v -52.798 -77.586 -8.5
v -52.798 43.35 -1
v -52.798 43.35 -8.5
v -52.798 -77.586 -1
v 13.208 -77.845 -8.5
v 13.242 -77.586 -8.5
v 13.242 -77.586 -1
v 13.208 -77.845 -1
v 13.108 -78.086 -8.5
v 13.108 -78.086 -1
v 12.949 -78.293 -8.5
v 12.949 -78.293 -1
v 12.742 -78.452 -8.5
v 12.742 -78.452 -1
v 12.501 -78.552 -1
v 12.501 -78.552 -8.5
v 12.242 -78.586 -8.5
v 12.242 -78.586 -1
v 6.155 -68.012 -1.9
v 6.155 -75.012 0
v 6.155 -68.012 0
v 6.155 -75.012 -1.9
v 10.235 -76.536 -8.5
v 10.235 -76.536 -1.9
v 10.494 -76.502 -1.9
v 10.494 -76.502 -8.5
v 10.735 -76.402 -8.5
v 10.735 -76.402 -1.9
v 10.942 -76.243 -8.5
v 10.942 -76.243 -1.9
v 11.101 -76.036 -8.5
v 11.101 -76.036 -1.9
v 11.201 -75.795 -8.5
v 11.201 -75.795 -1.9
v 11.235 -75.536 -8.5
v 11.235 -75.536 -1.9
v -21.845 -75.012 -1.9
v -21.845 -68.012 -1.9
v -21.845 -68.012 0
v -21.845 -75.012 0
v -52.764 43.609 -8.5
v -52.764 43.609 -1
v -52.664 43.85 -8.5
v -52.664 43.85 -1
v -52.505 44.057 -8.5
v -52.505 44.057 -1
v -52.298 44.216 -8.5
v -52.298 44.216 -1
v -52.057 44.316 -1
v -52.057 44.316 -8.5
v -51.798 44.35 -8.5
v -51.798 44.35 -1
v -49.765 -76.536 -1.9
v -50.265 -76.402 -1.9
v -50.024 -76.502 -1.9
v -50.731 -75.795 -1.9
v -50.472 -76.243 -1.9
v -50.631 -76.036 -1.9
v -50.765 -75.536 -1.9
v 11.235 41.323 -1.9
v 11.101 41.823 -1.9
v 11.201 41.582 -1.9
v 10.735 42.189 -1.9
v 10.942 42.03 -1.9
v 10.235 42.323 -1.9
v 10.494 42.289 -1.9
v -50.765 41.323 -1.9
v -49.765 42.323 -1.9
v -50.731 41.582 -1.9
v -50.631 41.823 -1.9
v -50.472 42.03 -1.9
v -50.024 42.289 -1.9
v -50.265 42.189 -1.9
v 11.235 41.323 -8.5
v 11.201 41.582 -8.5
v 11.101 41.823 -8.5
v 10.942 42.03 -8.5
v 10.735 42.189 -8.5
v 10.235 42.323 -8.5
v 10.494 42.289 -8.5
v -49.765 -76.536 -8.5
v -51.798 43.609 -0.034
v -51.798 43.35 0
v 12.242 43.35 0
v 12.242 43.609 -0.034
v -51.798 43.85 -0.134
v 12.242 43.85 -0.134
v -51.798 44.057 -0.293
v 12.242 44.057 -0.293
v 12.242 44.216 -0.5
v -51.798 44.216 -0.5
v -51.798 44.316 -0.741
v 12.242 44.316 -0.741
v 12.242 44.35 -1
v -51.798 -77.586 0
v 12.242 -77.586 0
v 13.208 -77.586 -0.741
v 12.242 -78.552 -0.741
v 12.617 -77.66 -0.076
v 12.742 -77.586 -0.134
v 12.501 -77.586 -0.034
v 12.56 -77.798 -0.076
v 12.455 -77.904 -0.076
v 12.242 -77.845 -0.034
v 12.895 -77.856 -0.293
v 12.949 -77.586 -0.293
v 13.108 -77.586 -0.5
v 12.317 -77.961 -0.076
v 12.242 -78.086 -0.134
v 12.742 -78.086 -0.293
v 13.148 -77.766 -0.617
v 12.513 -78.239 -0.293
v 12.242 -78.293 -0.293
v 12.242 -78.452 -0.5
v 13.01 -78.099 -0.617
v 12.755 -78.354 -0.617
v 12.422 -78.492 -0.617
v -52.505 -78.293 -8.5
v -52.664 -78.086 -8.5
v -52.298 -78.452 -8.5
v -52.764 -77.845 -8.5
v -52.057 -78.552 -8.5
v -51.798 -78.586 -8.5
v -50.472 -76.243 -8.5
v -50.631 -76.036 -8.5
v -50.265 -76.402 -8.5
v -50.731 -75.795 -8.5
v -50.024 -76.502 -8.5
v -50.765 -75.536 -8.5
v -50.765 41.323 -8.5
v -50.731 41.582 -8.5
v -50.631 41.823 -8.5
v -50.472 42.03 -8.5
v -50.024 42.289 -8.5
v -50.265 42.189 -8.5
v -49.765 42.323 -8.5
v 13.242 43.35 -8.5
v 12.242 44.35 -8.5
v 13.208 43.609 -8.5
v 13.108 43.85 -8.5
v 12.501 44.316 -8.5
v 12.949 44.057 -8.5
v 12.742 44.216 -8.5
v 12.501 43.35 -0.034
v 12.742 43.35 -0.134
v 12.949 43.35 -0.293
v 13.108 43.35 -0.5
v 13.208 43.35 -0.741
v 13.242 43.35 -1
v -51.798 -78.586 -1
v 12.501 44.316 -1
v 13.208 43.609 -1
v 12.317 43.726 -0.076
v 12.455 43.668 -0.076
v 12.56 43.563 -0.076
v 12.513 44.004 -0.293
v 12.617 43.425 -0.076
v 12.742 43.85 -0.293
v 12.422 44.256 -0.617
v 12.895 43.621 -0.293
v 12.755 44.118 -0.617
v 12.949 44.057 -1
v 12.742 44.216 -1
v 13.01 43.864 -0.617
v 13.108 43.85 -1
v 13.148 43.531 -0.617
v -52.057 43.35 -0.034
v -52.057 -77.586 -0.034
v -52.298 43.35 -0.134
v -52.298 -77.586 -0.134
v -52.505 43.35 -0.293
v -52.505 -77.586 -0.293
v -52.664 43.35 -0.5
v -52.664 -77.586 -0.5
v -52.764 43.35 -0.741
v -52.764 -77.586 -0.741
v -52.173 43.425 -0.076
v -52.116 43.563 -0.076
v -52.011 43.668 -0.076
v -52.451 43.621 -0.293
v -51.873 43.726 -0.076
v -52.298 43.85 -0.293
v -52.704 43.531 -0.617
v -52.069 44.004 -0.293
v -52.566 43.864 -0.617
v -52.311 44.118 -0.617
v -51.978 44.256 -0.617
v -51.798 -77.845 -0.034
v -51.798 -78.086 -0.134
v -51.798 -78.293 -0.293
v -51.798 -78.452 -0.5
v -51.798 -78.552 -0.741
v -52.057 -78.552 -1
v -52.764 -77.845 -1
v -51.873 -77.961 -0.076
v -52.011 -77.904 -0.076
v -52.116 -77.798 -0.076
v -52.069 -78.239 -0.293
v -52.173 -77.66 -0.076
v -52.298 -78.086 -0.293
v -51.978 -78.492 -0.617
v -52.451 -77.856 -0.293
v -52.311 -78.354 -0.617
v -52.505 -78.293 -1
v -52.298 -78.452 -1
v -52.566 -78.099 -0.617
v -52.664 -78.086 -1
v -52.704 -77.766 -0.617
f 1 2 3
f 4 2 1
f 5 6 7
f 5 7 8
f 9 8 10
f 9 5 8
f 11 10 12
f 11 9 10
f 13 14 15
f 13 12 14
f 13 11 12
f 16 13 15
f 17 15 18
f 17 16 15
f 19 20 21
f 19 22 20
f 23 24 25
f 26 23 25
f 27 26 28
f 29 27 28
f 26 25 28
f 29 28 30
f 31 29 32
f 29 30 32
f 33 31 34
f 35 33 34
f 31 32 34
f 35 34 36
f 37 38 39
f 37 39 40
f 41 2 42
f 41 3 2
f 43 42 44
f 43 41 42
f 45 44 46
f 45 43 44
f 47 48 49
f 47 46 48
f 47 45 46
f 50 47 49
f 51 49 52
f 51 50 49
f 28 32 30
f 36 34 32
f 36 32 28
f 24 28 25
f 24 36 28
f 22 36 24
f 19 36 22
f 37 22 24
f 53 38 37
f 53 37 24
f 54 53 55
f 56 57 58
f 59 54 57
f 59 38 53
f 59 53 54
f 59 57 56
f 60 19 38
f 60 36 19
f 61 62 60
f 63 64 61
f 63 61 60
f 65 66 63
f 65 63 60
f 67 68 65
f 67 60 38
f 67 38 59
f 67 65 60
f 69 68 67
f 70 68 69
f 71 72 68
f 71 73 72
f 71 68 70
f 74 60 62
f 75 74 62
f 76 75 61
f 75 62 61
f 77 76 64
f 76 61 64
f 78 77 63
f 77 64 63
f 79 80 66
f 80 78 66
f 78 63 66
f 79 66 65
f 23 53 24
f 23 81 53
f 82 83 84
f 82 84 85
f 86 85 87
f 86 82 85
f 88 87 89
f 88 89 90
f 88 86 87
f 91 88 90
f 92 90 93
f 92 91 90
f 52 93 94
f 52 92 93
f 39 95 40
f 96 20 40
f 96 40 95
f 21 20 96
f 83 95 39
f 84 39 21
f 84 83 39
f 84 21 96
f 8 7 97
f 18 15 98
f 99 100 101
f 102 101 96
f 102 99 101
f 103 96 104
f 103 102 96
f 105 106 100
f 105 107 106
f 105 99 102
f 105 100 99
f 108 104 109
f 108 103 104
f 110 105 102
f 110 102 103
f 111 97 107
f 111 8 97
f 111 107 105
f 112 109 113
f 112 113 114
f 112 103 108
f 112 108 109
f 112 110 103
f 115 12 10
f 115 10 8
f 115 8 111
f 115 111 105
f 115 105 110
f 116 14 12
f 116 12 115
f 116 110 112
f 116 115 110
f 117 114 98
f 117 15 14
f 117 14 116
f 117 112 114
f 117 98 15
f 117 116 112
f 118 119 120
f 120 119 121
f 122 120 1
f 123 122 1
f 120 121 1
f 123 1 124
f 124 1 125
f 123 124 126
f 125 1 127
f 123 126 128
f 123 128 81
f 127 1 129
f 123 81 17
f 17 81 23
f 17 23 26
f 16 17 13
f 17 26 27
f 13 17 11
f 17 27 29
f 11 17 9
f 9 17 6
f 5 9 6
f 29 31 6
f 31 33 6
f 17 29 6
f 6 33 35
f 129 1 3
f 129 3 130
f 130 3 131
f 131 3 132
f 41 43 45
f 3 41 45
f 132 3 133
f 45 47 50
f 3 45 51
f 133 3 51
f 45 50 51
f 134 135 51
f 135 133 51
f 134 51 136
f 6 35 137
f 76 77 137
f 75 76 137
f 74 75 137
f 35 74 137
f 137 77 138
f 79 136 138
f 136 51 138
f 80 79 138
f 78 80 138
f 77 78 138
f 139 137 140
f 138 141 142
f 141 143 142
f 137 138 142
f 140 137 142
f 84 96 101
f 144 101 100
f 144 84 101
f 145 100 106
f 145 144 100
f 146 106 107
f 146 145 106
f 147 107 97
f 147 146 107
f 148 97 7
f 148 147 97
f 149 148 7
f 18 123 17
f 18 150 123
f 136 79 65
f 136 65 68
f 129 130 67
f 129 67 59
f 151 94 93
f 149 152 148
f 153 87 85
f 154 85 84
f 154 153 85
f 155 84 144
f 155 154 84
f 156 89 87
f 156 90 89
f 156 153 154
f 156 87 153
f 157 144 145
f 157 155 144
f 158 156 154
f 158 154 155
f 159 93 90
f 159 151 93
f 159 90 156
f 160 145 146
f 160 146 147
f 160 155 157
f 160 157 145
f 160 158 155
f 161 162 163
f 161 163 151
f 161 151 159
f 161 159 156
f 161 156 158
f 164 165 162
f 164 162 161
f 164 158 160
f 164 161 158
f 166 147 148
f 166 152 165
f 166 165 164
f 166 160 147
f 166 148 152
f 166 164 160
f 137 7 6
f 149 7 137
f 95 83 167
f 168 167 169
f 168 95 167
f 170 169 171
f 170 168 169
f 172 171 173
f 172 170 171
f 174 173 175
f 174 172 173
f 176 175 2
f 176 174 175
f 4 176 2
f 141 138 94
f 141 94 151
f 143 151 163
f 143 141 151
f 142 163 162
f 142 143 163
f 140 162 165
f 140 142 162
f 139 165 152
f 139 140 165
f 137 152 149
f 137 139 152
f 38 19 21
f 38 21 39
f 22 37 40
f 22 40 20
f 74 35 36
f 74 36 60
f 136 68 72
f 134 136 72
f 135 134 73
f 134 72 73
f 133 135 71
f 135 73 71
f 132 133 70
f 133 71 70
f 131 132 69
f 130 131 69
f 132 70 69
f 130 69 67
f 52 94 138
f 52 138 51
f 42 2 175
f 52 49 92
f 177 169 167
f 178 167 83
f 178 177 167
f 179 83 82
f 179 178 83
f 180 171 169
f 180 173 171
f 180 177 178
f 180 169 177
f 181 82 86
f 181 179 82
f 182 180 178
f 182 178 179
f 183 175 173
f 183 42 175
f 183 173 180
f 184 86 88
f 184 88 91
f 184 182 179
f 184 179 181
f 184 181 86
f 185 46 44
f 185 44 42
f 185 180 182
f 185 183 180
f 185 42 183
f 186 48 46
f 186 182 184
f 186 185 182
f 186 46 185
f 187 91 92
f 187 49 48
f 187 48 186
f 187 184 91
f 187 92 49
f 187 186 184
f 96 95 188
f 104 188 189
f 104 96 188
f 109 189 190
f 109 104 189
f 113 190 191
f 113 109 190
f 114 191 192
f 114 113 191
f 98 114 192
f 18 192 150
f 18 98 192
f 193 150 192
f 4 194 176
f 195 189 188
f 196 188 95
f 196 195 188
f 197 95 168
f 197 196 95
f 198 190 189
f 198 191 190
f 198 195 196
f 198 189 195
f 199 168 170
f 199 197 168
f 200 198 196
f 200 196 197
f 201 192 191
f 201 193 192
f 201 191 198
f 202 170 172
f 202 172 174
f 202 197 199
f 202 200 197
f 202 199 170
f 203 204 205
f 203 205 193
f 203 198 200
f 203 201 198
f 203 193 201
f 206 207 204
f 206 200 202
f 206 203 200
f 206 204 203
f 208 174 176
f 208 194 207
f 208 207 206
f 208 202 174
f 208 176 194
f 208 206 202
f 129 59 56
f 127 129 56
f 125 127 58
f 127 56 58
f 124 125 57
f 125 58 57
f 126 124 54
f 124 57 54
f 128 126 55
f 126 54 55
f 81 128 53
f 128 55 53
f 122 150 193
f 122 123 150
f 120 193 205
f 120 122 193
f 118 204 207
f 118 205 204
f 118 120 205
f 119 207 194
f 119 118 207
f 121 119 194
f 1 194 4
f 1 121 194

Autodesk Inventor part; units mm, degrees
ref_plane "YZ Plane" through (0, 0, 0) normal (1, 0, 0) x (0, 1, 0)
ref_plane "XZ Plane" through (0, 0, 0) normal (0, 1, 0) x (-1, 0, 0)
ref_plane "XY Plane" through (0, 0, 0) normal (0, 0, 1) x (1, 0, 0)
sketch "Sketch1" plane through (0, 0, 0) normal (0, 0, 1) x (1, 0, 0)
  line L0 (-52.798, 44.3503) -> (-52.798, -78.5857)
  line L1 (-52.798, -78.5857) -> (13.242, -78.5857)
  line L2 (13.242, -78.5857) -> (13.242, 44.3503)
  line L3 (13.242, 44.3503) -> (-52.798, 44.3503)
  point P0 (0, 0)
  dimension "d0" = 122.936
  dimension "d1" = 66.04
extrude "Extrusion1" add sketch "Sketch1" against normal blind 8.5
sketch "Sketch2" plane through (0, 0, -8.5) normal (0, 0, -1) x (-1, 0, 0)
  line L0 (-11.2347, 42.323) -> (50.7653, 42.323)
  line L1 (50.7653, 42.323) -> (50.7653, -76.5363)
  line L2 (50.7653, -76.5363) -> (-11.2347, -76.5363)
  line L3 (-11.2347, -76.5363) -> (-11.2347, 42.323)
  line L4 (52.798, 44.3503) -> (-13.242, 44.3503) projected
  line L5 (52.798, -78.5857) -> (52.798, 44.3503) projected
  line L6 (-13.242, 44.3503) -> (-13.242, -78.5857) projected
  line L7 (-13.242, -78.5857) -> (52.798, -78.5857) projected
  point P0 (0, 0)
  dimension "d16" = 62
extrude "Extrusion2" cut sketch "Sketch2" against normal blind 6.6 contours L0 L1 L2 L3
sketch "Sketch3" plane through (0, 0, -1.9) normal (0, 0, -1) x (-1, 0, 0)
  line L0 (-6.1547, -68.0123) -> (21.8453, -68.0123)
  line L1 (21.8453, -68.0123) -> (21.8453, -75.0123)
  line L2 (21.8453, -75.0123) -> (-6.1547, -75.0123)
  line L3 (-6.1547, -75.0123) -> (-6.1547, -68.0123)
  line L4 (-11.2347, -76.5363) -> (-11.2347, 42.323) projected
  line L5 (50.7653, -76.5363) -> (-11.2347, -76.5363) projected
  point P0 (0, 0)
  dimension "d10" = 5.08
  dimension "d11" = 28
  dimension "d12" = 1.524
  dimension "d13" = 7
extrude "Extrusion3" cut sketch "Sketch3" against normal blind 2.76
fillet "Fillet1" radius 1 8 edges at (11.2347, 42.323, -5.2) (13.242, 44.3503, -4.25) (-52.798, -78.5857, -4.25) (-50.7653, -76.5363, -5.2) (-50.7653, 42.323, -5.2) (-52.798, 44.3503, -4.25) (13.242, -78.5857, -4.25) (11.2347, -76.5363, -5.2)
fillet "Fillet2" radius 1 8 edges at (-52.5051, 44.0574, 0) (-52.798, -17.1177, 0) (-52.5051, -78.2928, 0) (-19.778, -78.5857, 0) (12.9491, -78.2928, 0) (13.242, -17.1177, 0) (12.9491, 44.0574, 0) (-19.778, 44.3503, 0)
properties part number "Smart Lock Box Top Correct"
